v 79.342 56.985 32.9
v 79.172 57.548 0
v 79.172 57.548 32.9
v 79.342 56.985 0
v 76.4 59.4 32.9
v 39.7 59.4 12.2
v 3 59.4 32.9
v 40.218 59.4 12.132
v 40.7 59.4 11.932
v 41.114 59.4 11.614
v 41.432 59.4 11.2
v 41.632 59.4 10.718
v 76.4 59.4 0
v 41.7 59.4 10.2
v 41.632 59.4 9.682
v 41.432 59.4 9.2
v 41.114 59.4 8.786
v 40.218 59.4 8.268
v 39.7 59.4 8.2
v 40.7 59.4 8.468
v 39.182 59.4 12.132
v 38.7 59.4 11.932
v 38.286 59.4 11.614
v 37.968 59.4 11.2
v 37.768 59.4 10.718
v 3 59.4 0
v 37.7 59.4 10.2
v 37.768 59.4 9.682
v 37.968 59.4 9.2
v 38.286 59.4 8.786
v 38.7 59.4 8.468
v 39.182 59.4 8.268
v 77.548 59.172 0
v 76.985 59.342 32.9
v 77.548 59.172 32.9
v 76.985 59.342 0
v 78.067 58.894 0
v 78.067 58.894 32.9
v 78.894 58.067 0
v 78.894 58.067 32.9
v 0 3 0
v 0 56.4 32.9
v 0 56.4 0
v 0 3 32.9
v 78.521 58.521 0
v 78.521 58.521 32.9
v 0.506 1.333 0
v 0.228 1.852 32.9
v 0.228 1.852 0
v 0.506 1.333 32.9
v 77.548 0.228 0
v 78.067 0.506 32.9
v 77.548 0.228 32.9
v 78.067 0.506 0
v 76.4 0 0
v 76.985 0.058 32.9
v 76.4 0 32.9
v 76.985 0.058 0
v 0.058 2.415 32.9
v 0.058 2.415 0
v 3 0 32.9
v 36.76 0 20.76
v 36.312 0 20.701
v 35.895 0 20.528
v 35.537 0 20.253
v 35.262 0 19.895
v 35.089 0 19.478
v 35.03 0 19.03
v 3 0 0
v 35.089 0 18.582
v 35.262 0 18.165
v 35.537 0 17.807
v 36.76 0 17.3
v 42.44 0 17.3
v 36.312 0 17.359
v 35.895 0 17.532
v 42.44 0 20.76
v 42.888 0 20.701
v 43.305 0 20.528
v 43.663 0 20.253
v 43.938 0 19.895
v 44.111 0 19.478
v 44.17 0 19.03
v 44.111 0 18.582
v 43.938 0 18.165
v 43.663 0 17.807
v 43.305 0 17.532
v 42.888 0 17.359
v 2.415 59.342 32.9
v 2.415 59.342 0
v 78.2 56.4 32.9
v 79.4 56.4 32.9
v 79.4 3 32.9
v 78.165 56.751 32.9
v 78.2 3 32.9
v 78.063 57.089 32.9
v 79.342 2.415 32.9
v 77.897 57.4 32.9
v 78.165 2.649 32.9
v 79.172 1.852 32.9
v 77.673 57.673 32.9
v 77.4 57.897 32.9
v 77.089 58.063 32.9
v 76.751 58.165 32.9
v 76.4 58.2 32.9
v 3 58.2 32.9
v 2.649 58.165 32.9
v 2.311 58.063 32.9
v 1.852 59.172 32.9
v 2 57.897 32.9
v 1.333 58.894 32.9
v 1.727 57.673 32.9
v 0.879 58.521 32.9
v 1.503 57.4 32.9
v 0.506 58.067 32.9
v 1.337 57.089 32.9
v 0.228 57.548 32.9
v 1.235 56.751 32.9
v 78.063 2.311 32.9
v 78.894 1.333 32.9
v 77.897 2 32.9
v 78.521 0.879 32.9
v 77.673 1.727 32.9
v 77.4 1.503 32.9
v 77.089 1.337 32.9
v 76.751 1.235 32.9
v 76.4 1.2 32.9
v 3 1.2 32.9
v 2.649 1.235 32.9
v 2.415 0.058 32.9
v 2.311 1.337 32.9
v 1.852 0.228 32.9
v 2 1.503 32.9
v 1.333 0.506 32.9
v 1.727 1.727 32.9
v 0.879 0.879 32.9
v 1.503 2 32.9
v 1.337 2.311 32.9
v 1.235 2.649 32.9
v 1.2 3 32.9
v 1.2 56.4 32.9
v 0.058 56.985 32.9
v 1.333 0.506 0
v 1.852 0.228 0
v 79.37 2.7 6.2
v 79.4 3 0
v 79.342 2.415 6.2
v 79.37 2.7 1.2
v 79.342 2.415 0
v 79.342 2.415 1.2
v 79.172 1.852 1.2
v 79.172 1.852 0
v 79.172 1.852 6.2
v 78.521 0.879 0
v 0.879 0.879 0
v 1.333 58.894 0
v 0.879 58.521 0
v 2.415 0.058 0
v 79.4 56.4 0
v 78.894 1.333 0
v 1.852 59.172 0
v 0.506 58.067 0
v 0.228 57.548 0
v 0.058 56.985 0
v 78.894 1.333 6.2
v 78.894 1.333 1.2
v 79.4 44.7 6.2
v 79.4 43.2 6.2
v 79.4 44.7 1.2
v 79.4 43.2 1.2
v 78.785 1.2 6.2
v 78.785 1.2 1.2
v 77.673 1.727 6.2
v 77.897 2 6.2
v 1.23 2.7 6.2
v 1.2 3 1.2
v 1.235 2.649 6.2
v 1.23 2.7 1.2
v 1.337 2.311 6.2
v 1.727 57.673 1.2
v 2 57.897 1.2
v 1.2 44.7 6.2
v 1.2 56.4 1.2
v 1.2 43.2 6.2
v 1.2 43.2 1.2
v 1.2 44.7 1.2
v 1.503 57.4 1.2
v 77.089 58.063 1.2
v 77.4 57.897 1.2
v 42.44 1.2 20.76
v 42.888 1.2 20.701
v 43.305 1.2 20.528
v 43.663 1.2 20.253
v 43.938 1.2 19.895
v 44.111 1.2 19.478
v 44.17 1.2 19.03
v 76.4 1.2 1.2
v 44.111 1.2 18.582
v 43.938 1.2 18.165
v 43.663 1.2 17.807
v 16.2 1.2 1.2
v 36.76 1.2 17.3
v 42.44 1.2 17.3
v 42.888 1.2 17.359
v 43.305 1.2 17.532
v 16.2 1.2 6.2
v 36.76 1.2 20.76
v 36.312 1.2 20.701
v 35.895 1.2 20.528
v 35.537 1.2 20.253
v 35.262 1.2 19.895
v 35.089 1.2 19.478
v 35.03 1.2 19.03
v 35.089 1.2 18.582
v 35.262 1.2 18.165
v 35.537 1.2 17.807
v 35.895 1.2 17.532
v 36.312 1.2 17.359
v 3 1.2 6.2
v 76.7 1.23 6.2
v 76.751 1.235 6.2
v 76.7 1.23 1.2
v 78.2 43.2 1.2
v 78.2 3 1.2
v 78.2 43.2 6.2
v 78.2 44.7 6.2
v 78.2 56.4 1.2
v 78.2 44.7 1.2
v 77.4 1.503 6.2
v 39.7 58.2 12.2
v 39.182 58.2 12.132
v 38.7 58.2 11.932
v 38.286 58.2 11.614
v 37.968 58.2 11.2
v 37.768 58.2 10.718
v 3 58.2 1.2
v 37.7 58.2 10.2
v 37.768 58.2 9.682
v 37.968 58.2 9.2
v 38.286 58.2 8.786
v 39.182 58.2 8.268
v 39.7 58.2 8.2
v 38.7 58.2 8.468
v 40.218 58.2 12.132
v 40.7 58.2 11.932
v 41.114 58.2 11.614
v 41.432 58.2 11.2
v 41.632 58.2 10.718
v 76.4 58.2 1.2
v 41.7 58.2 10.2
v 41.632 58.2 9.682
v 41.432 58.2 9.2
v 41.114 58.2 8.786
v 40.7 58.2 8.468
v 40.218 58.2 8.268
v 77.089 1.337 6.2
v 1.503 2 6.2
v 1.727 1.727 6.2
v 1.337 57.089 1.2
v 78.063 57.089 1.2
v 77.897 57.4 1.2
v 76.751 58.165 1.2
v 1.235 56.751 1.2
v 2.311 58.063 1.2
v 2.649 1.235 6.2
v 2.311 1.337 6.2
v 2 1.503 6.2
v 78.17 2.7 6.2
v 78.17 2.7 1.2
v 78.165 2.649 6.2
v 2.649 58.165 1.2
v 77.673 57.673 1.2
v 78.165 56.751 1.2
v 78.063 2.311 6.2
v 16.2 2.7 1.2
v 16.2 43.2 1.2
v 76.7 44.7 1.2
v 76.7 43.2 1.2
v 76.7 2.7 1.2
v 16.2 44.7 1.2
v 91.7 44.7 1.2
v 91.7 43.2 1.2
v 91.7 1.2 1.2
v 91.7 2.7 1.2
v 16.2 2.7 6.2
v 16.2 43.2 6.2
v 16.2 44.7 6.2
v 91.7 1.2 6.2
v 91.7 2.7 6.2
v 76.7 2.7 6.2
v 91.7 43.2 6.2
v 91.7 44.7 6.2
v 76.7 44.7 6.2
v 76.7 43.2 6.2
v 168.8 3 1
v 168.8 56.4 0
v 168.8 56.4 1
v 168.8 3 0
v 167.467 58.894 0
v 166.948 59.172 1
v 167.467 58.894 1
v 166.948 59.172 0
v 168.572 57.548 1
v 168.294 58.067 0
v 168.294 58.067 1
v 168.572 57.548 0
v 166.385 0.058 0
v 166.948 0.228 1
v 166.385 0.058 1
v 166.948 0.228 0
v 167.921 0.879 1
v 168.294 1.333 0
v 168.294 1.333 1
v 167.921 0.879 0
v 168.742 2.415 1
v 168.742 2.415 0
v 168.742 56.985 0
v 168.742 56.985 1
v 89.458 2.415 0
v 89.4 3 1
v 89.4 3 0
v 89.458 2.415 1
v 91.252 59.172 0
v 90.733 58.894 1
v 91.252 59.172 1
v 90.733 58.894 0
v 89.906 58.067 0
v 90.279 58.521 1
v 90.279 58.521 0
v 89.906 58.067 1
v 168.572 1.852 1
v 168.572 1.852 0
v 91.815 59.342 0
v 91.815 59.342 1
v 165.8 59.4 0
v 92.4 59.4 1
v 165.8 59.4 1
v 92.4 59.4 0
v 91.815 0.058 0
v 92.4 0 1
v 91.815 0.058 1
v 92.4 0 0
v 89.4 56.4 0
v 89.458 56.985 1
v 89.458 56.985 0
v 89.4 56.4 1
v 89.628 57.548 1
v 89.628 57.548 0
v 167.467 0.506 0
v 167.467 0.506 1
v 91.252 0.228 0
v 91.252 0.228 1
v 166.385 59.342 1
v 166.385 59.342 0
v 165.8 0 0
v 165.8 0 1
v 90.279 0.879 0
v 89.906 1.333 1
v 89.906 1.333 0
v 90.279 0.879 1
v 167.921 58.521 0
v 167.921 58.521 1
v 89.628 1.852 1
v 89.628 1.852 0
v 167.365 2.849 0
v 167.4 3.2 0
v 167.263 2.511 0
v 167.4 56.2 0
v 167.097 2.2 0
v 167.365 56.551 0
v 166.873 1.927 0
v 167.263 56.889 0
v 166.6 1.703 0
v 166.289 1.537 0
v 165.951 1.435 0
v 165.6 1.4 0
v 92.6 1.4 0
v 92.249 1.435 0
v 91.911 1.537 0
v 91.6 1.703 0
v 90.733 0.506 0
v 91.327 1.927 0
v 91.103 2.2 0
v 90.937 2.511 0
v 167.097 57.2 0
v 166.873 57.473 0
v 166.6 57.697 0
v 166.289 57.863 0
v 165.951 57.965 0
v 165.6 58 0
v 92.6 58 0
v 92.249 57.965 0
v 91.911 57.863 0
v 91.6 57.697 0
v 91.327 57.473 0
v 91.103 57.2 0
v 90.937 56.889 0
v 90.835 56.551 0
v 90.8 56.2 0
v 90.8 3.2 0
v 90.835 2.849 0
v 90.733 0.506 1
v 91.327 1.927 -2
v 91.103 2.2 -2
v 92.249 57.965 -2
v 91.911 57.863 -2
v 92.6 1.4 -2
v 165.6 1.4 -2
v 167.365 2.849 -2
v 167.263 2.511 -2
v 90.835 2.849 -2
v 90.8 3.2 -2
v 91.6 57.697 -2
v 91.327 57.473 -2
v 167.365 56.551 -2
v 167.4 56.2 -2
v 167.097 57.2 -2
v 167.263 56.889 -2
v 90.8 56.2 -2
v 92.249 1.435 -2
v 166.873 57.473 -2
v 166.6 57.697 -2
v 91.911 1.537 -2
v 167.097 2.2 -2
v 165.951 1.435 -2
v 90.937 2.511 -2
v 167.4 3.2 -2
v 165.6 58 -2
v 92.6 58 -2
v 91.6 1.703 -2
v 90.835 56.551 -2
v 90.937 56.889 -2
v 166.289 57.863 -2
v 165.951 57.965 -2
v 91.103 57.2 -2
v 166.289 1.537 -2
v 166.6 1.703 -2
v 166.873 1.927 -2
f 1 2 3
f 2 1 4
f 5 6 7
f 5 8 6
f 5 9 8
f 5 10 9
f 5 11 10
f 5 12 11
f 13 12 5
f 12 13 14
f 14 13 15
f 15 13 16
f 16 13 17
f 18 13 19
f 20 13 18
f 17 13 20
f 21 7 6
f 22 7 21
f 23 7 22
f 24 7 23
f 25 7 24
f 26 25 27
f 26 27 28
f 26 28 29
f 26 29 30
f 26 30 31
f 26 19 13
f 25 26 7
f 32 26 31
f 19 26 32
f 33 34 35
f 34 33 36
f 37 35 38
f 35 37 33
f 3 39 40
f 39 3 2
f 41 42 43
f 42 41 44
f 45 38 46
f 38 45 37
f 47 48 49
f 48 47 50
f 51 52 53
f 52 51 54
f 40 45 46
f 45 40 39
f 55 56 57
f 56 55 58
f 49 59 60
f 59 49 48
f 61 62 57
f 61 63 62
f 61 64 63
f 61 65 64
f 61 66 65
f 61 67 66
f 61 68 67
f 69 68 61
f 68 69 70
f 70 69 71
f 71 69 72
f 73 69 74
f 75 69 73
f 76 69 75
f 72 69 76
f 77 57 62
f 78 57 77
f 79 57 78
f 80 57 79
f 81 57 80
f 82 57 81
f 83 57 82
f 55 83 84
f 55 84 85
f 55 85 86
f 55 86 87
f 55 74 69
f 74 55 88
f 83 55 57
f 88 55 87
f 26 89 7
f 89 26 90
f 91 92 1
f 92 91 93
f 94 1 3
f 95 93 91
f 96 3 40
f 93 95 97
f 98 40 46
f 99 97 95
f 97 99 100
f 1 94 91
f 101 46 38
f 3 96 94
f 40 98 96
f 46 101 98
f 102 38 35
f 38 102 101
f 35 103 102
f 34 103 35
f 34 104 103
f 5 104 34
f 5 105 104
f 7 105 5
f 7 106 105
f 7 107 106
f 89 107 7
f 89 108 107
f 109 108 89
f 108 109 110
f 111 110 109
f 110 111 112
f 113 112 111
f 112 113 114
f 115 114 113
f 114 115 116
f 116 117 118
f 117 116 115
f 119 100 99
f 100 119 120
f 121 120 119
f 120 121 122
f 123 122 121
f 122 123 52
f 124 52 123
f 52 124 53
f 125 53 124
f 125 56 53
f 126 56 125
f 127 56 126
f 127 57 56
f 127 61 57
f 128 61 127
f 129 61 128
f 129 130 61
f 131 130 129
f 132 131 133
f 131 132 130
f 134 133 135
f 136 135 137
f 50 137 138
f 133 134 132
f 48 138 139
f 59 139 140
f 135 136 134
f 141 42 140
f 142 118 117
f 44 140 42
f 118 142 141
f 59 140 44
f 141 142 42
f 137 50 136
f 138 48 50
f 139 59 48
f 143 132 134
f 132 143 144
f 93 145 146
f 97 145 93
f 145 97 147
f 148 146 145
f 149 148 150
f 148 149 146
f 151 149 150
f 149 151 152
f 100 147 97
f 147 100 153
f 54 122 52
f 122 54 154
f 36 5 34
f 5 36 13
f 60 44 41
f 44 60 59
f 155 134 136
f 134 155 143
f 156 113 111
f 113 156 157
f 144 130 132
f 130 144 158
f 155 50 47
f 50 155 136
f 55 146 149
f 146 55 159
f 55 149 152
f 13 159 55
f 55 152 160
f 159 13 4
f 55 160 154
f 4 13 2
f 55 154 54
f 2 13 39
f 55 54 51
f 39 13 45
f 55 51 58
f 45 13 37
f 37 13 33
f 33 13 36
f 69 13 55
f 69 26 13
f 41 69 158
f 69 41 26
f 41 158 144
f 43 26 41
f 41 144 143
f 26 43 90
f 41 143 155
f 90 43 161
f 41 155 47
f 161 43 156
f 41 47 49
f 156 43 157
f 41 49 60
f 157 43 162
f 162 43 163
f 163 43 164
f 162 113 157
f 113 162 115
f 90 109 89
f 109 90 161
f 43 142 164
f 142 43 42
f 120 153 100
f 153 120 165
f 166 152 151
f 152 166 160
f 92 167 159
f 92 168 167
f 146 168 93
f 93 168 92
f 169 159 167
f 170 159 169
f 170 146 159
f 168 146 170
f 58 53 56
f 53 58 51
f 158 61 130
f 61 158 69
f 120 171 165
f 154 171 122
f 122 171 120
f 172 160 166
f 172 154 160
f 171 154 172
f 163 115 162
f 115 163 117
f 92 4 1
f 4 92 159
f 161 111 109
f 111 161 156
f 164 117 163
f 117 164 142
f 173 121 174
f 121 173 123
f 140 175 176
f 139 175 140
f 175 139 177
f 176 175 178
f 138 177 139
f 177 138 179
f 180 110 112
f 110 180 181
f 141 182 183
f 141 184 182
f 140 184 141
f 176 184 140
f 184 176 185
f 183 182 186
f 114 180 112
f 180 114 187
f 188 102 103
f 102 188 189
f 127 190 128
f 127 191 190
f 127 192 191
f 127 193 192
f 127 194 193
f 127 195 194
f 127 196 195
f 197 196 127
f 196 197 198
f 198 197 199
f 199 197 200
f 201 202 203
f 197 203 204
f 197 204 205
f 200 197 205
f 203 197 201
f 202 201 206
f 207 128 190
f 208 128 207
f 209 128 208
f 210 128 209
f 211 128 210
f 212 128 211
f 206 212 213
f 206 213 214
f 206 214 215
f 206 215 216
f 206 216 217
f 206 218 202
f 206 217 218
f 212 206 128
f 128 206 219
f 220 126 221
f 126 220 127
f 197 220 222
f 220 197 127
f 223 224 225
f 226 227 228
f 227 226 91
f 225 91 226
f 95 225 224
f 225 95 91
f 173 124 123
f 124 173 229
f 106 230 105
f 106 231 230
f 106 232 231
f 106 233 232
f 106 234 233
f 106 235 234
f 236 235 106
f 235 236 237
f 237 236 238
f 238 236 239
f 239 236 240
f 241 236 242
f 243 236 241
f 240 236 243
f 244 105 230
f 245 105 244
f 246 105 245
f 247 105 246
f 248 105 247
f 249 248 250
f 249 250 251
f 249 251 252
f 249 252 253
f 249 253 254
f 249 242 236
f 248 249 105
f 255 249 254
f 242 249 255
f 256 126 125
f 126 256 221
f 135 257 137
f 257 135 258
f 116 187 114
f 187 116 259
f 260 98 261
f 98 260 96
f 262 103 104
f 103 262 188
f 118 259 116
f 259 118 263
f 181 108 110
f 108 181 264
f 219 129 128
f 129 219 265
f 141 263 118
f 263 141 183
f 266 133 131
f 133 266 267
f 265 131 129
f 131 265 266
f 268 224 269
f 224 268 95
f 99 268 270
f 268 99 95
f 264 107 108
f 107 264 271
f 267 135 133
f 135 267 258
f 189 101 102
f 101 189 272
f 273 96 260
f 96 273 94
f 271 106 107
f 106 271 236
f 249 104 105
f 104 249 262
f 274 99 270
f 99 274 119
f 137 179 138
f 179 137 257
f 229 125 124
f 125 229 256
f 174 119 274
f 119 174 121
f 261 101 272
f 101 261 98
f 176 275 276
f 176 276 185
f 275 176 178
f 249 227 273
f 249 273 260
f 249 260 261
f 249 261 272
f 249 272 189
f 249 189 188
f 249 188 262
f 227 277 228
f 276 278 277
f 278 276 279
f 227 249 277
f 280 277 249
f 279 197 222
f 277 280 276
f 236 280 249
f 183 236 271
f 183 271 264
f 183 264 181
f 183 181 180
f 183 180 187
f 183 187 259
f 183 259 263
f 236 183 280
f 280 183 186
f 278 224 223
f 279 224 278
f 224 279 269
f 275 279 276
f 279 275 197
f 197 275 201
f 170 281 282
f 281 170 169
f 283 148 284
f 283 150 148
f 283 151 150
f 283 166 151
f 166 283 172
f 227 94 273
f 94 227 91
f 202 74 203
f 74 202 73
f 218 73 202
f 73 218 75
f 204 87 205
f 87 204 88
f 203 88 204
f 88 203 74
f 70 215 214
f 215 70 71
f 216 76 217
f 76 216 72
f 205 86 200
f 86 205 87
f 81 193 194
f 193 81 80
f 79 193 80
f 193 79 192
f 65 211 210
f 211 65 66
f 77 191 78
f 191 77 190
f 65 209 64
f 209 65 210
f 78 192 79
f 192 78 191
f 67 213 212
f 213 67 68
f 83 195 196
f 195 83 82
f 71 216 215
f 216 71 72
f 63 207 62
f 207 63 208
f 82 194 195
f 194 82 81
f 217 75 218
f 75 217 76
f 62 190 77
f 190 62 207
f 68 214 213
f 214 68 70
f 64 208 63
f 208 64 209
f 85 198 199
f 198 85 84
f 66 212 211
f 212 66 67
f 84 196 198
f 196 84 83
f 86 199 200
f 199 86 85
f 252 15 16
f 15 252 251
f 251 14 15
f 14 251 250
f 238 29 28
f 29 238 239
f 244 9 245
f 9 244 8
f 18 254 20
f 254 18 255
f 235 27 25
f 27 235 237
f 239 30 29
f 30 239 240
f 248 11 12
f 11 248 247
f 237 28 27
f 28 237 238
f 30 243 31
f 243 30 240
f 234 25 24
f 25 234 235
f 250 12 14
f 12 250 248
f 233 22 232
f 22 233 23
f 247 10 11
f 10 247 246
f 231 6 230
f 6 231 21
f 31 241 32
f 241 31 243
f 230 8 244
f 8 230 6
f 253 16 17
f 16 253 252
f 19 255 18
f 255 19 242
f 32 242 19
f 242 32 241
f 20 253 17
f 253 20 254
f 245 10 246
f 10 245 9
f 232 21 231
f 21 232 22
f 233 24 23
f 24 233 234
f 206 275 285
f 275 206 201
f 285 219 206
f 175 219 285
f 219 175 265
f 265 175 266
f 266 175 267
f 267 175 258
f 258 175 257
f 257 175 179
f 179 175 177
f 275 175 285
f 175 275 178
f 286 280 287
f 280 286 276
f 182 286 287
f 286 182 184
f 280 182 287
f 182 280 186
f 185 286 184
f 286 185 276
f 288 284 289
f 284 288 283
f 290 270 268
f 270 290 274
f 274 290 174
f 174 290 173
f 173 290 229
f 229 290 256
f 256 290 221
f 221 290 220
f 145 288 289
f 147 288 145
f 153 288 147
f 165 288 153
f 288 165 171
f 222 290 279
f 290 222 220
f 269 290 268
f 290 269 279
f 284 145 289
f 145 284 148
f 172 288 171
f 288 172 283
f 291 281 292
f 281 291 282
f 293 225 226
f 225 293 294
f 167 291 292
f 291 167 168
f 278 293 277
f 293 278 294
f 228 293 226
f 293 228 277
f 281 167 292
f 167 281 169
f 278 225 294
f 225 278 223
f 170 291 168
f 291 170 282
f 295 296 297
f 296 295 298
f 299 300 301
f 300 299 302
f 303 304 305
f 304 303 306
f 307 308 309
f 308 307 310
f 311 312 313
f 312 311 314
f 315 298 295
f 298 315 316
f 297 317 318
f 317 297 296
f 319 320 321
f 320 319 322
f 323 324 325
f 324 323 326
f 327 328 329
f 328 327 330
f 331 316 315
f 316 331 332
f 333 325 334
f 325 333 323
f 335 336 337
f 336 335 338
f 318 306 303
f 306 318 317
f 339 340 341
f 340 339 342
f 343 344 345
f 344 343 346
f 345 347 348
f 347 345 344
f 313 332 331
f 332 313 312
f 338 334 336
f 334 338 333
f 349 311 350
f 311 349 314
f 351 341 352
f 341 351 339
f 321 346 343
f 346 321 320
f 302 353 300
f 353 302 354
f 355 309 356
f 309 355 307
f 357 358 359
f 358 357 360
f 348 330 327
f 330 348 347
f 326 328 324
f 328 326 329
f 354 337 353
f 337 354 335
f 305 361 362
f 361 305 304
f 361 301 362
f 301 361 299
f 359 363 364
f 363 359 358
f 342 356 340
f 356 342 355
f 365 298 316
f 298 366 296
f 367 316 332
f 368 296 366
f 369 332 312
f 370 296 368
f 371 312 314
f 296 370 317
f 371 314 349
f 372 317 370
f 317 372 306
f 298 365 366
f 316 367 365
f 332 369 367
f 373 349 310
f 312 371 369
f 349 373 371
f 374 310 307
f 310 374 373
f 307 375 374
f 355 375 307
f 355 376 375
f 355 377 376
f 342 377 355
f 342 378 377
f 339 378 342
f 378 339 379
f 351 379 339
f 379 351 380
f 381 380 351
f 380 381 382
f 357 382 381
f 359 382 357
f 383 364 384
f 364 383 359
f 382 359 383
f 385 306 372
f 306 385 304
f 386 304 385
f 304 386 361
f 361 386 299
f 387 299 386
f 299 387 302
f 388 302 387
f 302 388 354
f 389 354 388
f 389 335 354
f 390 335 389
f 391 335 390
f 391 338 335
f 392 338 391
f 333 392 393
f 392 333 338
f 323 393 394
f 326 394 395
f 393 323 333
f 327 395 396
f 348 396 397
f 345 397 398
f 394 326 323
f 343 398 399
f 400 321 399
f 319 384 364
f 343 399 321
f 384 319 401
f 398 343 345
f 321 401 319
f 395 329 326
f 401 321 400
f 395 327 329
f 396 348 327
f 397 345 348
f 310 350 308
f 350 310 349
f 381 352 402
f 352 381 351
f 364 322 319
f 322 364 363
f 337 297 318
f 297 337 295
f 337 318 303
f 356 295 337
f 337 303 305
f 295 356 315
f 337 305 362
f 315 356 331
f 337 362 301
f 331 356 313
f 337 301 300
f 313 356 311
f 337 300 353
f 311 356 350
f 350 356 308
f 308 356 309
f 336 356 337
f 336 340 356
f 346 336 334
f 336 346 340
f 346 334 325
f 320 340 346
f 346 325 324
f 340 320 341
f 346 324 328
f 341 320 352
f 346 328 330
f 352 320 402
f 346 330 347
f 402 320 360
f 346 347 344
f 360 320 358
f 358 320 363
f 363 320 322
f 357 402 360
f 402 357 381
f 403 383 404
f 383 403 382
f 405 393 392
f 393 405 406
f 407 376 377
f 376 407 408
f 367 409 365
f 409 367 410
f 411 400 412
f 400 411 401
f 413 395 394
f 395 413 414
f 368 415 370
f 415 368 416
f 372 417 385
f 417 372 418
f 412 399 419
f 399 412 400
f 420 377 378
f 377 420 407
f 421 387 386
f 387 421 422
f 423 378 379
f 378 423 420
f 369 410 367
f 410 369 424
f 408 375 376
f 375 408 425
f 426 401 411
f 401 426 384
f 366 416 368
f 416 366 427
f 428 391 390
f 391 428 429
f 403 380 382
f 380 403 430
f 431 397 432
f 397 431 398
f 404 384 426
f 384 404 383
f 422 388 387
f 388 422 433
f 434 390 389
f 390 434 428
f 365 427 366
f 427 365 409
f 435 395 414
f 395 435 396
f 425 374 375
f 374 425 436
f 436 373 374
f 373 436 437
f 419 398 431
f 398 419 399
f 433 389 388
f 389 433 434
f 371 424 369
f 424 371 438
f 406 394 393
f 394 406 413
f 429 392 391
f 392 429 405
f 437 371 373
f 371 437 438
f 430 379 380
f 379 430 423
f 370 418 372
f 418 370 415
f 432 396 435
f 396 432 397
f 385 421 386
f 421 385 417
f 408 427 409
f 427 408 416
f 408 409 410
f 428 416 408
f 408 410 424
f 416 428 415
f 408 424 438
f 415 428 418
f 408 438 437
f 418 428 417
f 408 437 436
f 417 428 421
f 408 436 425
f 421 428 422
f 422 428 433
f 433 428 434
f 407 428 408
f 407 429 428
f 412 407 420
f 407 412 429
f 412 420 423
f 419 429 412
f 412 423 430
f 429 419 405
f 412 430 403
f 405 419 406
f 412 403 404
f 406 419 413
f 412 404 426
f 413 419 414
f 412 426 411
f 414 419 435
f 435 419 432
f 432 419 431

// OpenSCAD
// file: ../../../lib/ventilation.scad
// ============================================
// Ventilation Pattern Library
// ============================================
// Parametric vent patterns for enclosures.
// Subtract these from walls/lids for airflow.
// ============================================

// --- Slot Vent Grid ---
// Parallel rectangular slots.
//   width       = total pattern width
//   height      = total pattern height
//   slots       = number of slots
//   slot_width  = width of each slot opening
//   depth       = wall thickness to cut through
module slot_vent(width, height, slots = 5, slot_width = 1.5, depth = 5) {
    slot_spacing = width / slots;
    for (i = [0 : slots - 1]) {
        translate([i * slot_spacing + (slot_spacing - slot_width) / 2, 0, 0])
            cube([slot_width, depth, height]);
    }
}

// --- Honeycomb Vent ---
// Hexagonal pattern for high airflow with strength.
//   width      = total pattern width
//   height     = total pattern height
//   hex_size   = flat-to-flat diameter of each hexagon
//   wall       = thickness between hexagons
//   depth      = wall thickness to cut through
module honeycomb_vent(width, height, hex_size = 5, wall = 1.2, depth = 5) {
    spacing_x = hex_size + wall;
    spacing_y = (hex_size + wall) * sin(60);
    cols = floor(width / spacing_x);
    rows = floor(height / spacing_y);

    intersection() {
        // Clip to bounding box
        cube([width, depth, height]);

        // Hexagon array
        for (row = [0 : rows]) {
            offset_x = (row % 2 == 0) ? 0 : spacing_x / 2;
            for (col = [0 : cols]) {
                x = col * spacing_x + offset_x + hex_size / 2;
                z = row * spacing_y + hex_size / 2;
                if (x > 0 && x < width && z > 0 && z < height)
                    translate([x, 0, z])
                        rotate([-90, 0, 0])
                            cylinder(d = hex_size, h = depth, $fn = 6);
            }
        }
    }
}

// --- Circular Vent Array ---
// Grid of circular holes.
//   width    = total pattern width
//   height   = total pattern height
//   hole_d   = hole diameter
//   spacing  = center-to-center distance
//   depth    = wall thickness
module circle_vent(width, height, hole_d = 3, spacing = 5, depth = 5) {
    cols = floor(width / spacing);
    rows = floor(height / spacing);

    intersection() {
        cube([width, depth, height]);
        for (col = [0 : cols]) {
            for (row = [0 : rows]) {
                x = col * spacing + spacing / 2;
                z = row * spacing + spacing / 2;
                if (x < width && z < height)
                    translate([x, 0, z])
                        rotate([-90, 0, 0])
                            cylinder(d = hole_d, h = depth, $fn = 20);
            }
        }
    }
}
// file: ../../../lib/connectors.scad
// ============================================
// Connector Cutout Library
// ============================================
// Parametric cutout shapes for common connectors.
// Use difference() to subtract these from enclosure walls.
//
// All modules create a solid shape meant to be subtracted.
// Position with translate() before subtracting.
// ============================================

// --- USB-C Port Cutout ---
//   clearance = extra space around the port
//   depth     = wall thickness to cut through
module usb_c_cutout(clearance = 0.3, depth = 5) {
    w = 8.94 + clearance;   // USB-C width
    h = 3.26 + clearance;   // USB-C height
    r = h / 2;              // USB-C has fully rounded ends
    hull() {
        translate([r, 0, r])
            rotate([-90, 0, 0])
                cylinder(r = r, h = depth, $fn = 24);
        translate([w - r, 0, r])
            rotate([-90, 0, 0])
                cylinder(r = r, h = depth, $fn = 24);
    }
}

// --- Micro-USB Port Cutout ---
//   clearance = extra space around the port
//   depth     = wall thickness to cut through
module micro_usb_cutout(clearance = 0.3, depth = 5) {
    w = 7.5 + clearance;
    h = 2.5 + clearance;
    translate([0, 0, 0])
        cube([w, depth, h]);
}

// --- DC Barrel Jack Cutout (5.5x2.1mm) ---
//   clearance = extra space
//   depth     = wall thickness
module barrel_jack_cutout(clearance = 0.3, depth = 5) {
    d = 5.5 + clearance;
    translate([d / 2, 0, d / 2])
        rotate([-90, 0, 0])
            cylinder(d = d, h = depth, $fn = 32);
}

// --- JST-SM 3-Pin Connector Cutout ---
//   clearance = extra space
//   depth     = wall thickness
module jst_sm_3pin_cutout(clearance = 0.3, depth = 5) {
    w = 8.0 + clearance;
    h = 4.5 + clearance;
    cube([w, depth, h]);
}

// --- Generic Wire Channel ---
// Rounded slot for wires to pass through a wall.
//   diameter = channel diameter (size for your wire bundle)
//   depth    = wall thickness to cut through
module wire_channel(diameter = 4, depth = 5) {
    translate([diameter / 2, 0, diameter / 2])
        rotate([-90, 0, 0])
            cylinder(d = diameter, h = depth, $fn = 24);
}

// --- Rectangular Slot ---
// Simple rectangular cutout for generic openings.
//   w     = width
//   h     = height
//   depth = wall thickness
module rect_slot(w, h, depth = 5) {
    cube([w, depth, h]);
}
// file: ../../../lib/enclosure-utils.scad
// ============================================
// Enclosure Utilities
// ============================================
// Generic parametric box and lid generators.
// Use these as building blocks for any enclosure.
// ============================================

use <printer-profile.scad>

// --- Rounded Box (hollow) ---
// Creates a hollow box with rounded corners.
//   size     = [x, y, z] outer dimensions
//   wall     = wall thickness
//   radius   = corner radius
//   floor_h  = bottom thickness
module rounded_box(size, wall = 1.2, radius = 2, floor_h = 1.2) {
    difference() {
        // Outer shell
        rounded_cube(size, radius);
        // Inner cavity
        translate([wall, wall, floor_h])
            rounded_cube([
                size[0] - 2 * wall,
                size[1] - 2 * wall,
                size[2]  // open top
            ], max(radius - wall, 0.1));
    }
}

// --- Rounded Cube (solid) ---
// A cube with rounded vertical edges.
//   size   = [x, y, z]
//   radius = corner radius
module rounded_cube(size, radius = 2) {
    r = min(radius, min(size[0], size[1]) / 2 - 0.01);
    hull() {
        for (x = [r, size[0] - r])
            for (y = [r, size[1] - r])
                translate([x, y, 0])
                    cylinder(h = size[2], r = r, $fn = 32);
    }
}

// --- Simple Lid ---
// A flat lid that sits on top of a box.
//   size       = [x, y] matching box outer dimensions
//   wall       = wall thickness of the box it fits
//   lid_h      = total lid height
//   lip_h      = inner lip depth (fits inside box)
//   clearance  = gap for fit (use xy_clearance from printer-profile)
//   radius     = corner radius matching the box
module simple_lid(size, wall = 1.2, lid_h = 3, lip_h = 2, clearance = 0.2, radius = 2) {
    top_thickness = lid_h - lip_h;

    // Outer cap
    rounded_cube([size[0], size[1], top_thickness], radius);

    // Inner lip
    translate([wall + clearance, wall + clearance, -lip_h])
        rounded_cube([
            size[0] - 2 * (wall + clearance),
            size[1] - 2 * (wall + clearance),
            lip_h + 0.01  // slight overlap to merge with cap
        ], max(radius - wall, 0.1));
}

// --- Board Ledge ---
// Internal ledge/shelf to rest a PCB on.
//   length   = ledge length along the wall
//   depth    = how far the ledge sticks out from the wall
//   height   = ledge thickness
module board_ledge(length, depth = 1.5, height = 1.0) {
    cube([length, depth, height]);
}

// --- Screw Boss ---
// Cylindrical post for self-tapping screws.
//   outer_d = outer diameter of the boss
//   inner_d = pilot hole diameter
//   height  = boss height
module screw_boss(outer_d = 6, inner_d = 2.2, height = 8) {
    difference() {
        cylinder(d = outer_d, h = height, $fn = 32);
        translate([0, 0, -0.1])
            cylinder(d = inner_d, h = height + 0.2, $fn = 24);
    }
}
// file: measurements.scad
// ============================================
// ESP32-WROOM-32 DevKitC + AITRIP Expansion Board
// Measurements — Datasheet-derived placeholders
// ============================================
// UPDATE these values with caliper measurements
// of your actual boards for a precise fit.
// ============================================

// --- ESP32-WROOM-32 DevKitC V4 ---
esp32_pcb_length = 51.5;   // mm (long edge)
esp32_pcb_width  = 28.0;   // mm (short edge)
esp32_pcb_thick  = 1.6;    // mm (FR4 board thickness)
esp32_total_height = 12.0; // mm (tallest component: WROOM RF shield)

// USB-C port on ESP32
usb_c_width  = 8.94;       // mm
usb_c_height = 3.26;       // mm
usb_c_offset_from_edge = 1.0; // mm above PCB surface
usb_c_center_x = esp32_pcb_width / 2; // centered on short edge

// Pin headers (2 rows of 19 pins, 2.54mm pitch)
pin_header_pitch = 2.54;   // mm
pin_header_rows  = 2;
pin_header_pins  = 19;     // per row
pin_header_height = 8.5;   // mm (male pin length below PCB)

// --- AITRIP Expansion Board ---
// These are ESTIMATES — measure your actual board!
exp_board_length = 75.0;   // mm (long edge)
exp_board_width  = 55.0;   // mm (short edge)
exp_board_thick  = 1.6;    // mm (FR4)
exp_board_height = 5.0;    // mm (components below socket headers)

// Socket headers on expansion board
socket_header_height = 8.5; // mm (receives ESP32 pin headers)

// --- Combined Stack ---
// Expansion board sits flat, ESP32 plugs in on top
total_stack_height = exp_board_height + exp_board_thick
                   + socket_header_height + esp32_pcb_thick
                   + esp32_total_height;
// Estimated: ~28-30mm total

// --- Wire Exits ---
// D16 (data) and GND jumper wires exit from expansion board
wire_bundle_diameter = 4.0; // mm (2x F/M jumper wires)

// --- Enclosure Padding ---
// Extra internal space beyond the board dimensions
internal_padding = 1.0;    // mm per side (for wire routing, airflow)
// file: ../../../lib/printer-profile.scad
// ============================================
// Printer Profile: Bambu Lab P1S
// ============================================
// Central source of truth for printer-specific
// constraints and tolerances. Include this in
// any model that needs to respect hardware limits.
//
// IMPORTANT: Tune tolerance values after running
// a calibration/tolerance test print on YOUR machine.
// ============================================

// --- Build Volume (mm) ---
max_build_x = 256;
max_build_y = 256;
max_build_z = 256;

// --- Nozzle ---
nozzle_diameter = 0.4;

// --- Tolerances (mm) ---
// Start conservative, tighten after test prints
xy_clearance      = 0.2;   // gap for loose-fit parts (lid on box)
press_fit         = 0.1;   // interference fit (snug inserts)
hole_clearance    = 0.3;   // oversized holes for screws/pins
snap_fit_clearance = 0.25; // snap-fit hooks and catches

// --- Wall Thickness (mm) ---
min_wall        = 0.8;   // 2 perimeters — absolute minimum
standard_wall   = 1.2;   // 3 perimeters — good default
strong_wall     = 2.0;   // structural / screw boss walls

// --- Layer Height Presets (mm) ---
draft_layer    = 0.28;
standard_layer = 0.20;
detail_layer   = 0.12;
fine_layer     = 0.08;

// --- Bottom/Top Thickness (mm) ---
// Should be a multiple of layer height
min_floor    = 0.8;   // 4 layers at 0.2mm
standard_floor = 1.2; // 6 layers at 0.2mm

// --- Bed ---
bed_type = "textured_pei";

// --- Material Defaults ---
// Override per-project as needed
default_material = "PLA";
// main file
// ============================================
// ESP32 + WLED Enclosure — Proof of Concept
// ============================================
// Two-piece snap-fit enclosure for AITRIP
// ESP32-WROOM-32 DevKitC on expansion board.
//
// Designed for Bambu Lab P1S, PLA, 0.4mm nozzle.
// ============================================

include <../../../lib/printer-profile.scad>
include <measurements.scad>
use <../../../lib/enclosure-utils.scad>
use <../../../lib/connectors.scad>
use <../../../lib/ventilation.scad>

// --- Enclosure Dimensions ---
wall = standard_wall;       // 1.2mm (3 perimeters)
floor_h = standard_floor;   // 1.2mm

// Internal cavity sized to expansion board + padding
inner_x = exp_board_length + 2 * internal_padding;
inner_y = exp_board_width  + 2 * internal_padding;
inner_z = total_stack_height + 3; // +3mm headroom above ESP32

// Outer dimensions
outer_x = inner_x + 2 * wall;
outer_y = inner_y + 2 * wall;
outer_z = inner_z + floor_h;

corner_r = 3; // corner radius

// --- Bottom Shell ---
module bottom_shell() {
    difference() {
        // Main box
        rounded_box([outer_x, outer_y, outer_z],
                    wall = wall, radius = corner_r, floor_h = floor_h);

        // USB-C cutout (centered on short edge, at ESP32 height)
        usb_z = floor_h + exp_board_height + exp_board_thick
              + socket_header_height + usb_c_offset_from_edge;
        translate([outer_x / 2 - usb_c_width / 2 - xy_clearance,
                   -0.1,
                   usb_z])
            usb_c_cutout(clearance = xy_clearance, depth = wall + 0.2);

        // Wire channel (opposite end for D16 + GND jumpers)
        wire_z = floor_h + exp_board_height + 2;
        translate([outer_x / 2 - wire_bundle_diameter / 2,
                   outer_y - wall - 0.1,
                   wire_z])
            wire_channel(diameter = wire_bundle_diameter, depth = wall + 0.2);

        // Ventilation slots on left side
        vent_z = floor_h + 5;
        translate([-0.1, outer_y * 0.2, vent_z])
            rotate([0, 0, 0])
                slot_vent(width = outer_y * 0.6, height = inner_z * 0.5,
                         slots = 4, slot_width = 1.5, depth = wall + 0.2);

        // Ventilation slots on right side
        translate([outer_x - wall, outer_y * 0.2, vent_z])
            slot_vent(width = outer_y * 0.6, height = inner_z * 0.5,
                     slots = 4, slot_width = 1.5, depth = wall + 0.2);
    }

    // Board ledges (support the expansion board)
    ledge_z = floor_h;
    ledge_len = 15;

    // Left side ledges (front and back)
    translate([wall, wall, ledge_z])
        board_ledge(ledge_len, depth = 1.5, height = exp_board_height);
    translate([wall, outer_y - wall - ledge_len, ledge_z])
        board_ledge(ledge_len, depth = 1.5, height = exp_board_height);

    // Right side ledges (front and back)
    translate([outer_x - wall - 1.5, wall, ledge_z])
        board_ledge(ledge_len, depth = 1.5, height = exp_board_height);
    translate([outer_x - wall - 1.5, outer_y - wall - ledge_len, ledge_z])
        board_ledge(ledge_len, depth = 1.5, height = exp_board_height);
}

// --- Lid ---
module lid() {
    lid_h = 3;
    lip_h = 2;

    difference() {
        simple_lid([outer_x, outer_y],
                   wall = wall, lid_h = lid_h, lip_h = lip_h,
                   clearance = xy_clearance, radius = corner_r);

        // Top ventilation (honeycomb)
        translate([outer_x * 0.15, -0.1, 0.8])
            rotate([90, 0, 0])
                rotate([0, 0, 90])
                    honeycomb_vent(width = outer_x * 0.7,
                                  height = outer_y * 0.7,
                                  hex_size = 5, wall = 1.2,
                                  depth = lid_h + 0.2);
    }
}

// --- Render ---
// Show bottom shell
bottom_shell();

// Show lid offset to the side for printing
translate([outer_x + 10, 0, 0])
    lid();
